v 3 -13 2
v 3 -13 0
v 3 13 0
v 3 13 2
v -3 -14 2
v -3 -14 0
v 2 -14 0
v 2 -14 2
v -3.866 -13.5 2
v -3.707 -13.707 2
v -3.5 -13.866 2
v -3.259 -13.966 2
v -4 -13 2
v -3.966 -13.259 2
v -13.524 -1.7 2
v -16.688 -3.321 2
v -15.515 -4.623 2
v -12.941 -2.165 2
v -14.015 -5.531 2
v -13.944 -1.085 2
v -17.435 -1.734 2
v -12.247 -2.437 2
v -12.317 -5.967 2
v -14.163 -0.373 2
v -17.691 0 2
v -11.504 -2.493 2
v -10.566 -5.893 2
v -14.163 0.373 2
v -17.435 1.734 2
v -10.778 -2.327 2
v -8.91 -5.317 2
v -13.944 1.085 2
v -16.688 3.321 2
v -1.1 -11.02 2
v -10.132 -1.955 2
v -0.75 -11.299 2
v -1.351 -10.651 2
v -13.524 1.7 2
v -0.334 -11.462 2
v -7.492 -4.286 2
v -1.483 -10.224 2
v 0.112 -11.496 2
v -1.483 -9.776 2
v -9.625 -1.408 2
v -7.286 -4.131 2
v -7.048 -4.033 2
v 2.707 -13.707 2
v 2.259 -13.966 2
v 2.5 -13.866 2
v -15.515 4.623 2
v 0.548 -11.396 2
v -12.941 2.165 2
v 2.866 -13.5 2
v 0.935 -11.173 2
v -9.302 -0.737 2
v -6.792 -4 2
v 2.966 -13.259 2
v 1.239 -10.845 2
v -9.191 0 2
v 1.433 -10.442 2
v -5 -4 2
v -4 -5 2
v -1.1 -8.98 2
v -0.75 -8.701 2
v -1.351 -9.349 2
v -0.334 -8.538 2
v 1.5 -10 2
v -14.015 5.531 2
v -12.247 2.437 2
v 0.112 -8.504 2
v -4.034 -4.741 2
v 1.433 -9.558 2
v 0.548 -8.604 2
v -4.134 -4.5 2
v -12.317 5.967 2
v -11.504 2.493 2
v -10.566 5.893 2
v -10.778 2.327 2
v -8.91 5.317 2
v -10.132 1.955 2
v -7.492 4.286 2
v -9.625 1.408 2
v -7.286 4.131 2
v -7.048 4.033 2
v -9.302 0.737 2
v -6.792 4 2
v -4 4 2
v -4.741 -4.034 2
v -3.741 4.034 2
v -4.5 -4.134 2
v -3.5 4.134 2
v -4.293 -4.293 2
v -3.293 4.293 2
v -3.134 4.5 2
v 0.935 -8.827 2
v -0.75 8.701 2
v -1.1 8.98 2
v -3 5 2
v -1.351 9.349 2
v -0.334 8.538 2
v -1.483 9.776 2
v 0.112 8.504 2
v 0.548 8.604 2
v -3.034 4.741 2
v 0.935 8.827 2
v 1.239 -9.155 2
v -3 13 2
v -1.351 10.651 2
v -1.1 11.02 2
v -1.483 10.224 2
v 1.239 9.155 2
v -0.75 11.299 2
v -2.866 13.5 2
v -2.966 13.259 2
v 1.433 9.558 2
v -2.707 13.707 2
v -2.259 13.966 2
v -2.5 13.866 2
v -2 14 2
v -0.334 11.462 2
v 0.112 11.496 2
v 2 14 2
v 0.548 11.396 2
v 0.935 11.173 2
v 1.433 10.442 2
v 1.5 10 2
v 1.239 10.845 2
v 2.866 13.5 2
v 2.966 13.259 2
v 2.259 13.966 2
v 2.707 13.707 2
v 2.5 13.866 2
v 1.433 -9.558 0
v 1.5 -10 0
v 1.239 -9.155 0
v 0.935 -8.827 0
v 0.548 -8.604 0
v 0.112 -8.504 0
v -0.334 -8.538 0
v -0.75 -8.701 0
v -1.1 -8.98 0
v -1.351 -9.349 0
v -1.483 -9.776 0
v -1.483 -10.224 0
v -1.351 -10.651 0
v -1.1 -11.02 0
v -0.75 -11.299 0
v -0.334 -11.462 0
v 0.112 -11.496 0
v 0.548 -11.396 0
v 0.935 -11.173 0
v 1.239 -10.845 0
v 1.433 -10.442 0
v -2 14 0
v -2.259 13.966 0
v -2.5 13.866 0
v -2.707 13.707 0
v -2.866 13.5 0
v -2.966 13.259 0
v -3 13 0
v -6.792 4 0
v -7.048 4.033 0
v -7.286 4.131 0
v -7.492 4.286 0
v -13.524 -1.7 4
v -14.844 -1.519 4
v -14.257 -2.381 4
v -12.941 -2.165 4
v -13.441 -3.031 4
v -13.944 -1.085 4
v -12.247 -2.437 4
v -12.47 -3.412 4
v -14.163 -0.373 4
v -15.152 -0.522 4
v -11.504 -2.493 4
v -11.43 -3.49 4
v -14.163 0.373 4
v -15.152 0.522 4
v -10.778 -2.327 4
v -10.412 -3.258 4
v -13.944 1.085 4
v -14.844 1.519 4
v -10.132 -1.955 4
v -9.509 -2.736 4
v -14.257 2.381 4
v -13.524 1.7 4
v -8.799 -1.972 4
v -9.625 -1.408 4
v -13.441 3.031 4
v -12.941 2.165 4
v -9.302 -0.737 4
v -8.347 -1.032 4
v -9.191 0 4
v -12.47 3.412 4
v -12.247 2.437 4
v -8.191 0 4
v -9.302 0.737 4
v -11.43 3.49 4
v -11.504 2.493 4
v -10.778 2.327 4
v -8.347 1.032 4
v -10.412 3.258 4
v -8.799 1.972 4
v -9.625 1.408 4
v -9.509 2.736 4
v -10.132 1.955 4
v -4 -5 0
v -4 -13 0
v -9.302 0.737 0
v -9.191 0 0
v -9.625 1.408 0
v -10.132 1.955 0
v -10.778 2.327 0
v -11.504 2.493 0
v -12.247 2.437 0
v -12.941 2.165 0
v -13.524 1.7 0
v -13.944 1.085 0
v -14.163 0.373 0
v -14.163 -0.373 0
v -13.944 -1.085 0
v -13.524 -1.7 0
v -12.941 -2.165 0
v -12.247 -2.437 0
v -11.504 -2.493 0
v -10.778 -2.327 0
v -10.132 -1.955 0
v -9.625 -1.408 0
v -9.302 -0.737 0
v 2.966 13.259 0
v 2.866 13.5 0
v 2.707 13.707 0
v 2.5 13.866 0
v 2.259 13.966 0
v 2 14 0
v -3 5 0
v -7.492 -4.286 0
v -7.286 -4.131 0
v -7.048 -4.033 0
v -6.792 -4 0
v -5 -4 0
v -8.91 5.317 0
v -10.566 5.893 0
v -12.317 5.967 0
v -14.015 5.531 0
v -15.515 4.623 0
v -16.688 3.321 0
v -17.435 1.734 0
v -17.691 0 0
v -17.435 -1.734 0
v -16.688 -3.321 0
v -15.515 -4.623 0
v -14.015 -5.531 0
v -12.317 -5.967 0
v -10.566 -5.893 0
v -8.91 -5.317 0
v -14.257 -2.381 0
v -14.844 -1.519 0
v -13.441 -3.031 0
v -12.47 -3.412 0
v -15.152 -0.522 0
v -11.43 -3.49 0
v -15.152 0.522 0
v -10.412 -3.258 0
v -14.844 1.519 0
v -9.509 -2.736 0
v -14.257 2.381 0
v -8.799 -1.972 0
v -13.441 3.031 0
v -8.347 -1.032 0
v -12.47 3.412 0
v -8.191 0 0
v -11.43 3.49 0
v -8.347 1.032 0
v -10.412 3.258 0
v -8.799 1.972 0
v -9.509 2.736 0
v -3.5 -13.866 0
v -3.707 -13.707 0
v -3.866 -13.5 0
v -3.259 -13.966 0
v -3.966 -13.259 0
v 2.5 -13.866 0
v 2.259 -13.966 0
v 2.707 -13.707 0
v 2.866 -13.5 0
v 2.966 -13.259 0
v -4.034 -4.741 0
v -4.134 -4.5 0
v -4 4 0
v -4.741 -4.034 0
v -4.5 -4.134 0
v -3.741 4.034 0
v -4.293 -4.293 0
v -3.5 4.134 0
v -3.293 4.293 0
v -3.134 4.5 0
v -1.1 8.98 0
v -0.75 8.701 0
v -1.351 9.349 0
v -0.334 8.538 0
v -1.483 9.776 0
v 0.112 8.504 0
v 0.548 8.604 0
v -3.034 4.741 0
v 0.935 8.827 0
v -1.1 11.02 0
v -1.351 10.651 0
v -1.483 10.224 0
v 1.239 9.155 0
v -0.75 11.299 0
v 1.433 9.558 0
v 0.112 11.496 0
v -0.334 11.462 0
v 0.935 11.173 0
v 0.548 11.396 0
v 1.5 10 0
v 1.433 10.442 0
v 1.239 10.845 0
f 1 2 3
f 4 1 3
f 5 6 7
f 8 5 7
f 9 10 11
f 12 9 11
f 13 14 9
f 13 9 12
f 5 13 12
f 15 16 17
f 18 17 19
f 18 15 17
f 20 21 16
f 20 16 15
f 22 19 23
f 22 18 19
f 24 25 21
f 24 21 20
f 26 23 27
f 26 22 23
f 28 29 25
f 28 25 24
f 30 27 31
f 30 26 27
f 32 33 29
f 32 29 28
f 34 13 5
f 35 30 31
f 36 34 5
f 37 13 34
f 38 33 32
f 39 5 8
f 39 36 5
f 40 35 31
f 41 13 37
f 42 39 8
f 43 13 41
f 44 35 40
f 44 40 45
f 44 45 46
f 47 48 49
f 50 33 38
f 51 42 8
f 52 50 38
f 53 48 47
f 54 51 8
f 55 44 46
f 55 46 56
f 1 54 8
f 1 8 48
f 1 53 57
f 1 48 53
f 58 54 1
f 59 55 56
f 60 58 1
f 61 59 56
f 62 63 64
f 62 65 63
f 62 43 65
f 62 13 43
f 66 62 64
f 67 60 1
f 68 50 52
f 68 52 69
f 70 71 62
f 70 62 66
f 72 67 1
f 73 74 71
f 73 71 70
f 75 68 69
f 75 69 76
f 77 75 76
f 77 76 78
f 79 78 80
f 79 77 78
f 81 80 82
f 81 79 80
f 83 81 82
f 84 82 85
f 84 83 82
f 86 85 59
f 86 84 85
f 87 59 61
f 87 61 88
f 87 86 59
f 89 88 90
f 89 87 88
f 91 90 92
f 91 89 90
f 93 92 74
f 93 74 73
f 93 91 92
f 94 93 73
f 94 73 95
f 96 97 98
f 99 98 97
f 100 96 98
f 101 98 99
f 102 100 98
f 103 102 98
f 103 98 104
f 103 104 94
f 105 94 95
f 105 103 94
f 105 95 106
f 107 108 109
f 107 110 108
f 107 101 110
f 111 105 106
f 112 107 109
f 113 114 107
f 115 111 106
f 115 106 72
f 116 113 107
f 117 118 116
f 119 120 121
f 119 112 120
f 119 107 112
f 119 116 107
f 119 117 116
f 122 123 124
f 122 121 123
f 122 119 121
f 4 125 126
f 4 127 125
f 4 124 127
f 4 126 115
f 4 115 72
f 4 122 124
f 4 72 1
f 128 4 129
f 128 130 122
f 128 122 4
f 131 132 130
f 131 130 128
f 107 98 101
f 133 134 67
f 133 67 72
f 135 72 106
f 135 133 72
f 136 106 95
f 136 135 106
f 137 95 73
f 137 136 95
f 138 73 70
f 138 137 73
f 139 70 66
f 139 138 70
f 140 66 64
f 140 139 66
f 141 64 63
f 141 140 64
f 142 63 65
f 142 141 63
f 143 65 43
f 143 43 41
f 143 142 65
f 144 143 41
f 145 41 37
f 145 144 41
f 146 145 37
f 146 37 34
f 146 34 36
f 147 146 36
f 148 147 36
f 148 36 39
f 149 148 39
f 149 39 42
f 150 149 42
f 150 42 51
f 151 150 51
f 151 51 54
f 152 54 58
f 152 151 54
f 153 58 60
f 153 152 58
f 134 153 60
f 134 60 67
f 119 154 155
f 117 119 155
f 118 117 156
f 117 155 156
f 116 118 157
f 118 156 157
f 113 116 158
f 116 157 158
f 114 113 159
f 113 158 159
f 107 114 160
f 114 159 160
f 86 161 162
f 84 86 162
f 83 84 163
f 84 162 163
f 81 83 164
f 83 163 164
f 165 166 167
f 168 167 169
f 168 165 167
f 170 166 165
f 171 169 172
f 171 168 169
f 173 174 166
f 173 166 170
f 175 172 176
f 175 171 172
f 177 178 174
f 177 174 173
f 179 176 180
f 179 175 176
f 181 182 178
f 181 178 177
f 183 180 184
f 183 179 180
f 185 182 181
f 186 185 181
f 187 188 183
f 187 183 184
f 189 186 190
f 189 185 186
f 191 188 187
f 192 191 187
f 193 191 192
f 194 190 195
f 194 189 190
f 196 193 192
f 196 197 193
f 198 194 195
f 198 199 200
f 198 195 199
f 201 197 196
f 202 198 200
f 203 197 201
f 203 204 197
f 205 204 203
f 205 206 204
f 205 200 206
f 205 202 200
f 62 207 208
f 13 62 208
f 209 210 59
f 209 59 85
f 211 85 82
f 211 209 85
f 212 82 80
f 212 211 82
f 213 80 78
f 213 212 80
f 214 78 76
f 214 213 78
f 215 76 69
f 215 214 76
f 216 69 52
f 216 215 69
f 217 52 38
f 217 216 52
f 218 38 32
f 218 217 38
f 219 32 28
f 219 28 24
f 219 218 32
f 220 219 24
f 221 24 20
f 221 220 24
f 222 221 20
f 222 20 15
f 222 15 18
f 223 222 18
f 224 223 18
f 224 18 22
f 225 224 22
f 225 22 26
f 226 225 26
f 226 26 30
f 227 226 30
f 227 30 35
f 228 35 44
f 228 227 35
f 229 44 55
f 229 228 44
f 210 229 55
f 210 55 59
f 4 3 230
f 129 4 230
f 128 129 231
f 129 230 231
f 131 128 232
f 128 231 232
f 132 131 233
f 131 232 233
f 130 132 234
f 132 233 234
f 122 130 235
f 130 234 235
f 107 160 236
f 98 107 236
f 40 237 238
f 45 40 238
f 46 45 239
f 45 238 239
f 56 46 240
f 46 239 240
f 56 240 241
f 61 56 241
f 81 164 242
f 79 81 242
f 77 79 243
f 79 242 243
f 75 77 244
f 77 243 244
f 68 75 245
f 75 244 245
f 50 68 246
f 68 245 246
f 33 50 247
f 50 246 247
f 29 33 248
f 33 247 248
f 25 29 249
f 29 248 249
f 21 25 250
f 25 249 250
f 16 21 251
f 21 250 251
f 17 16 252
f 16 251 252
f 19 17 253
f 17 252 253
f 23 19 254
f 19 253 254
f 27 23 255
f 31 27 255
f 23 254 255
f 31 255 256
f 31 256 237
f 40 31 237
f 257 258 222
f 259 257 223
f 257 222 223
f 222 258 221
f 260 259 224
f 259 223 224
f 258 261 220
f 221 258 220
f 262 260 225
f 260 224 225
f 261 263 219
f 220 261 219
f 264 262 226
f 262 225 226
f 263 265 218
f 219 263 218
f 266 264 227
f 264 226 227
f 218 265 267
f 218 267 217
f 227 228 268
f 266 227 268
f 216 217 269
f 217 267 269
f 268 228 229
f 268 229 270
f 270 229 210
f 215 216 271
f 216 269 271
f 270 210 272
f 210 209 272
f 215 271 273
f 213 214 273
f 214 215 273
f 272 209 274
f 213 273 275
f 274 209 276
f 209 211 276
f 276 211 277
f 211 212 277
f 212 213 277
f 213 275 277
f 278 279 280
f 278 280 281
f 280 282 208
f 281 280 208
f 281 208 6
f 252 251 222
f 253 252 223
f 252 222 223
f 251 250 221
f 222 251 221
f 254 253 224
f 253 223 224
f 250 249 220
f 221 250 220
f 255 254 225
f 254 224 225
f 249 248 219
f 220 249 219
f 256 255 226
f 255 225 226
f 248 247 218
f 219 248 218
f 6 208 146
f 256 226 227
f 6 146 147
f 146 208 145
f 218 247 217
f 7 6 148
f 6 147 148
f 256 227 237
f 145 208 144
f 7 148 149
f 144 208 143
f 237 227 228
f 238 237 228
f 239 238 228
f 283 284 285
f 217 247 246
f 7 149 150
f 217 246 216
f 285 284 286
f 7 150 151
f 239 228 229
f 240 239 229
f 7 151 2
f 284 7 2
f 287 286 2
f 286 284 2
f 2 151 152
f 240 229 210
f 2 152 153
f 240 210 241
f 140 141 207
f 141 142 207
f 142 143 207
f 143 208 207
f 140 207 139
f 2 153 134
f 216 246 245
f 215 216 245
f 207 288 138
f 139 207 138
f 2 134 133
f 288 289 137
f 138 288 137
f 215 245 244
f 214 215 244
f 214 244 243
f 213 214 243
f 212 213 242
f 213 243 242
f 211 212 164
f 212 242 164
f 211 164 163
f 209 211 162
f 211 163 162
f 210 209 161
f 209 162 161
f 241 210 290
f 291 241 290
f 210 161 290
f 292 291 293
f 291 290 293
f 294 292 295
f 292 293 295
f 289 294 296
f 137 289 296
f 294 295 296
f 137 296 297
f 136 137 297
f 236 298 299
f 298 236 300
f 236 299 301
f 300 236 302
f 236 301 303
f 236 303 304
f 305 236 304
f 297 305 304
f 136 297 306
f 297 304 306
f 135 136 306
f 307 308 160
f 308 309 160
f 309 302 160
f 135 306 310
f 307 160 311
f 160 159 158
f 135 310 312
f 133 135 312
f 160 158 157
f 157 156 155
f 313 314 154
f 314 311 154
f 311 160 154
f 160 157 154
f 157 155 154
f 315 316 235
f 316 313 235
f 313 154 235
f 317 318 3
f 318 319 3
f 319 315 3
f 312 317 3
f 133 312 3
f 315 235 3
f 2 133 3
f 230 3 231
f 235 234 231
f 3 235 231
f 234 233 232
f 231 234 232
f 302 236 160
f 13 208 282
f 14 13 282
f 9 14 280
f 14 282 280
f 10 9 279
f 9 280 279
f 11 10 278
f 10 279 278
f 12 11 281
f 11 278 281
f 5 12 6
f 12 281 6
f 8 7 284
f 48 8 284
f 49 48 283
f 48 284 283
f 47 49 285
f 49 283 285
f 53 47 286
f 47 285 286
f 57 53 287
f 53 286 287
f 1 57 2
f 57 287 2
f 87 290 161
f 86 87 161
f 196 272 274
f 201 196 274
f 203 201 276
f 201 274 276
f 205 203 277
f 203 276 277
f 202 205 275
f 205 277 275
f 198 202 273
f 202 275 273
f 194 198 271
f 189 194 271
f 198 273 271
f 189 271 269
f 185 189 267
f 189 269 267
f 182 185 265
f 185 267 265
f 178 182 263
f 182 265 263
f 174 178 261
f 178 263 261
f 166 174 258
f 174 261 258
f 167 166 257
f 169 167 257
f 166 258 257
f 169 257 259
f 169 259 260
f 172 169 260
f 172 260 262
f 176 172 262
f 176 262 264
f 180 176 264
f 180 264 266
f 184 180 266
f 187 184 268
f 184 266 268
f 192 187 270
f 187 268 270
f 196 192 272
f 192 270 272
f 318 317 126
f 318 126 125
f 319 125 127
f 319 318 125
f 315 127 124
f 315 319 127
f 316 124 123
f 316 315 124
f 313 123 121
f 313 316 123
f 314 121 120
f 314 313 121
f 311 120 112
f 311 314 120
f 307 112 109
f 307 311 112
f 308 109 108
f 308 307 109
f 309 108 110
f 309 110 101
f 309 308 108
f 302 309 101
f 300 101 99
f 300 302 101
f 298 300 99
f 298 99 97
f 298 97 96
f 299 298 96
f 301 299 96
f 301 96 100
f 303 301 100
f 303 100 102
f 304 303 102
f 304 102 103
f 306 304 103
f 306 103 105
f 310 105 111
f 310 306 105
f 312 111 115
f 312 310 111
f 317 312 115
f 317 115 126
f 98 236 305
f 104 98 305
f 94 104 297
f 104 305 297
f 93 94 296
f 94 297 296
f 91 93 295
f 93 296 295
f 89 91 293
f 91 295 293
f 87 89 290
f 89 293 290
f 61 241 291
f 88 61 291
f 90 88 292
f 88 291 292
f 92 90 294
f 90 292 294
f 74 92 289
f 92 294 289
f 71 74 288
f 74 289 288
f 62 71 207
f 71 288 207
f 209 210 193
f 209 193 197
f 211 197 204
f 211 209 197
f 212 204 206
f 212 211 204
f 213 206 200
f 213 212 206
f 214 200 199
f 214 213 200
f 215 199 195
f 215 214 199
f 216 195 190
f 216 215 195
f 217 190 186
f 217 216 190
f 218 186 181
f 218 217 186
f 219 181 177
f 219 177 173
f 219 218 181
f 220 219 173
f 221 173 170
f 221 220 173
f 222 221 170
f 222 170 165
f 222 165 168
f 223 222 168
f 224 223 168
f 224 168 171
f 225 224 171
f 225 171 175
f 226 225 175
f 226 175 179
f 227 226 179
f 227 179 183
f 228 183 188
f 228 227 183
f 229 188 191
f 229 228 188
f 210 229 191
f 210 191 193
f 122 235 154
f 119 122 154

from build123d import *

# Parameters (mm, degrees)
F0_R     = 3.5
F0_R_2   = 2.5
F1_DEPTH = 4
F0_R_3   = 1.5
F2_DEPTH = 2


with BuildPart() as f1:
    # F0 (on Top) → F1 (new body)
    with BuildSketch(Plane.XY):
        with Locations((-11.691081, 0)):
            Circle(F0_R)
        with Locations((-11.691081, 0)):
            Circle(F0_R_2, mode=Mode.SUBTRACT)
    extrude(amount=F1_DEPTH)


with BuildPart() as f2:
    # F0 (on Top) → F2 (new body)
    with BuildSketch(Plane.XY):
        with BuildLine():
            Line((2, 14), (-2, 14))
            ThreePointArc((-2, 14), (-2.707107, 13.707107), (-3, 13))
            Line((-3, 13), (-3, 5))
            ThreePointArc((-3, 5), (-3.292893, 4.292893), (-4, 4))
            Line((-4, 4), (-6.792102, 4))
            ThreePointArc((-6.792102, 4), (-7.170066, 4.07418), (-7.491956, 4.285714))
            ThreePointArc((-7.491956, 4.285714), (-17.691081, 0), (-7.491956, -4.285714))
            ThreePointArc((-7.491956, -4.285714), (-7.170066, -4.07418), (-6.792102, -4))
            Line((-6.792102, -4), (-5, -4))
            ThreePointArc((-5, -4), (-4.292893, -4.292893), (-4, -5))
            Line((-4, -5), (-4, -13))
            ThreePointArc((-4, -13), (-3.707107, -13.707107), (-3, -14))
            Line((-3, -14), (2, -14))
            ThreePointArc((2, -14), (2.707107, -13.707107), (3, -13))
            Line((3, -13), (3, 13))
            ThreePointArc((3, 13), (2.707107, 13.707107), (2, 14))
        make_face()
        with Locations((0, -10)):
            Circle(F0_R_3, mode=Mode.SUBTRACT)
        with Locations((-11.691081, 0)):
            Circle(F0_R, mode=Mode.SUBTRACT)
        with Locations((0, 10)):
            Circle(F0_R_3, mode=Mode.SUBTRACT)
        with Locations((-11.691081, 0)):
            Circle(F0_R)
        with Locations((-11.691081, 0)):
            Circle(F0_R_2, mode=Mode.SUBTRACT)
    extrude(amount=F2_DEPTH)


solid = Compound([f1.part, f2.part])
